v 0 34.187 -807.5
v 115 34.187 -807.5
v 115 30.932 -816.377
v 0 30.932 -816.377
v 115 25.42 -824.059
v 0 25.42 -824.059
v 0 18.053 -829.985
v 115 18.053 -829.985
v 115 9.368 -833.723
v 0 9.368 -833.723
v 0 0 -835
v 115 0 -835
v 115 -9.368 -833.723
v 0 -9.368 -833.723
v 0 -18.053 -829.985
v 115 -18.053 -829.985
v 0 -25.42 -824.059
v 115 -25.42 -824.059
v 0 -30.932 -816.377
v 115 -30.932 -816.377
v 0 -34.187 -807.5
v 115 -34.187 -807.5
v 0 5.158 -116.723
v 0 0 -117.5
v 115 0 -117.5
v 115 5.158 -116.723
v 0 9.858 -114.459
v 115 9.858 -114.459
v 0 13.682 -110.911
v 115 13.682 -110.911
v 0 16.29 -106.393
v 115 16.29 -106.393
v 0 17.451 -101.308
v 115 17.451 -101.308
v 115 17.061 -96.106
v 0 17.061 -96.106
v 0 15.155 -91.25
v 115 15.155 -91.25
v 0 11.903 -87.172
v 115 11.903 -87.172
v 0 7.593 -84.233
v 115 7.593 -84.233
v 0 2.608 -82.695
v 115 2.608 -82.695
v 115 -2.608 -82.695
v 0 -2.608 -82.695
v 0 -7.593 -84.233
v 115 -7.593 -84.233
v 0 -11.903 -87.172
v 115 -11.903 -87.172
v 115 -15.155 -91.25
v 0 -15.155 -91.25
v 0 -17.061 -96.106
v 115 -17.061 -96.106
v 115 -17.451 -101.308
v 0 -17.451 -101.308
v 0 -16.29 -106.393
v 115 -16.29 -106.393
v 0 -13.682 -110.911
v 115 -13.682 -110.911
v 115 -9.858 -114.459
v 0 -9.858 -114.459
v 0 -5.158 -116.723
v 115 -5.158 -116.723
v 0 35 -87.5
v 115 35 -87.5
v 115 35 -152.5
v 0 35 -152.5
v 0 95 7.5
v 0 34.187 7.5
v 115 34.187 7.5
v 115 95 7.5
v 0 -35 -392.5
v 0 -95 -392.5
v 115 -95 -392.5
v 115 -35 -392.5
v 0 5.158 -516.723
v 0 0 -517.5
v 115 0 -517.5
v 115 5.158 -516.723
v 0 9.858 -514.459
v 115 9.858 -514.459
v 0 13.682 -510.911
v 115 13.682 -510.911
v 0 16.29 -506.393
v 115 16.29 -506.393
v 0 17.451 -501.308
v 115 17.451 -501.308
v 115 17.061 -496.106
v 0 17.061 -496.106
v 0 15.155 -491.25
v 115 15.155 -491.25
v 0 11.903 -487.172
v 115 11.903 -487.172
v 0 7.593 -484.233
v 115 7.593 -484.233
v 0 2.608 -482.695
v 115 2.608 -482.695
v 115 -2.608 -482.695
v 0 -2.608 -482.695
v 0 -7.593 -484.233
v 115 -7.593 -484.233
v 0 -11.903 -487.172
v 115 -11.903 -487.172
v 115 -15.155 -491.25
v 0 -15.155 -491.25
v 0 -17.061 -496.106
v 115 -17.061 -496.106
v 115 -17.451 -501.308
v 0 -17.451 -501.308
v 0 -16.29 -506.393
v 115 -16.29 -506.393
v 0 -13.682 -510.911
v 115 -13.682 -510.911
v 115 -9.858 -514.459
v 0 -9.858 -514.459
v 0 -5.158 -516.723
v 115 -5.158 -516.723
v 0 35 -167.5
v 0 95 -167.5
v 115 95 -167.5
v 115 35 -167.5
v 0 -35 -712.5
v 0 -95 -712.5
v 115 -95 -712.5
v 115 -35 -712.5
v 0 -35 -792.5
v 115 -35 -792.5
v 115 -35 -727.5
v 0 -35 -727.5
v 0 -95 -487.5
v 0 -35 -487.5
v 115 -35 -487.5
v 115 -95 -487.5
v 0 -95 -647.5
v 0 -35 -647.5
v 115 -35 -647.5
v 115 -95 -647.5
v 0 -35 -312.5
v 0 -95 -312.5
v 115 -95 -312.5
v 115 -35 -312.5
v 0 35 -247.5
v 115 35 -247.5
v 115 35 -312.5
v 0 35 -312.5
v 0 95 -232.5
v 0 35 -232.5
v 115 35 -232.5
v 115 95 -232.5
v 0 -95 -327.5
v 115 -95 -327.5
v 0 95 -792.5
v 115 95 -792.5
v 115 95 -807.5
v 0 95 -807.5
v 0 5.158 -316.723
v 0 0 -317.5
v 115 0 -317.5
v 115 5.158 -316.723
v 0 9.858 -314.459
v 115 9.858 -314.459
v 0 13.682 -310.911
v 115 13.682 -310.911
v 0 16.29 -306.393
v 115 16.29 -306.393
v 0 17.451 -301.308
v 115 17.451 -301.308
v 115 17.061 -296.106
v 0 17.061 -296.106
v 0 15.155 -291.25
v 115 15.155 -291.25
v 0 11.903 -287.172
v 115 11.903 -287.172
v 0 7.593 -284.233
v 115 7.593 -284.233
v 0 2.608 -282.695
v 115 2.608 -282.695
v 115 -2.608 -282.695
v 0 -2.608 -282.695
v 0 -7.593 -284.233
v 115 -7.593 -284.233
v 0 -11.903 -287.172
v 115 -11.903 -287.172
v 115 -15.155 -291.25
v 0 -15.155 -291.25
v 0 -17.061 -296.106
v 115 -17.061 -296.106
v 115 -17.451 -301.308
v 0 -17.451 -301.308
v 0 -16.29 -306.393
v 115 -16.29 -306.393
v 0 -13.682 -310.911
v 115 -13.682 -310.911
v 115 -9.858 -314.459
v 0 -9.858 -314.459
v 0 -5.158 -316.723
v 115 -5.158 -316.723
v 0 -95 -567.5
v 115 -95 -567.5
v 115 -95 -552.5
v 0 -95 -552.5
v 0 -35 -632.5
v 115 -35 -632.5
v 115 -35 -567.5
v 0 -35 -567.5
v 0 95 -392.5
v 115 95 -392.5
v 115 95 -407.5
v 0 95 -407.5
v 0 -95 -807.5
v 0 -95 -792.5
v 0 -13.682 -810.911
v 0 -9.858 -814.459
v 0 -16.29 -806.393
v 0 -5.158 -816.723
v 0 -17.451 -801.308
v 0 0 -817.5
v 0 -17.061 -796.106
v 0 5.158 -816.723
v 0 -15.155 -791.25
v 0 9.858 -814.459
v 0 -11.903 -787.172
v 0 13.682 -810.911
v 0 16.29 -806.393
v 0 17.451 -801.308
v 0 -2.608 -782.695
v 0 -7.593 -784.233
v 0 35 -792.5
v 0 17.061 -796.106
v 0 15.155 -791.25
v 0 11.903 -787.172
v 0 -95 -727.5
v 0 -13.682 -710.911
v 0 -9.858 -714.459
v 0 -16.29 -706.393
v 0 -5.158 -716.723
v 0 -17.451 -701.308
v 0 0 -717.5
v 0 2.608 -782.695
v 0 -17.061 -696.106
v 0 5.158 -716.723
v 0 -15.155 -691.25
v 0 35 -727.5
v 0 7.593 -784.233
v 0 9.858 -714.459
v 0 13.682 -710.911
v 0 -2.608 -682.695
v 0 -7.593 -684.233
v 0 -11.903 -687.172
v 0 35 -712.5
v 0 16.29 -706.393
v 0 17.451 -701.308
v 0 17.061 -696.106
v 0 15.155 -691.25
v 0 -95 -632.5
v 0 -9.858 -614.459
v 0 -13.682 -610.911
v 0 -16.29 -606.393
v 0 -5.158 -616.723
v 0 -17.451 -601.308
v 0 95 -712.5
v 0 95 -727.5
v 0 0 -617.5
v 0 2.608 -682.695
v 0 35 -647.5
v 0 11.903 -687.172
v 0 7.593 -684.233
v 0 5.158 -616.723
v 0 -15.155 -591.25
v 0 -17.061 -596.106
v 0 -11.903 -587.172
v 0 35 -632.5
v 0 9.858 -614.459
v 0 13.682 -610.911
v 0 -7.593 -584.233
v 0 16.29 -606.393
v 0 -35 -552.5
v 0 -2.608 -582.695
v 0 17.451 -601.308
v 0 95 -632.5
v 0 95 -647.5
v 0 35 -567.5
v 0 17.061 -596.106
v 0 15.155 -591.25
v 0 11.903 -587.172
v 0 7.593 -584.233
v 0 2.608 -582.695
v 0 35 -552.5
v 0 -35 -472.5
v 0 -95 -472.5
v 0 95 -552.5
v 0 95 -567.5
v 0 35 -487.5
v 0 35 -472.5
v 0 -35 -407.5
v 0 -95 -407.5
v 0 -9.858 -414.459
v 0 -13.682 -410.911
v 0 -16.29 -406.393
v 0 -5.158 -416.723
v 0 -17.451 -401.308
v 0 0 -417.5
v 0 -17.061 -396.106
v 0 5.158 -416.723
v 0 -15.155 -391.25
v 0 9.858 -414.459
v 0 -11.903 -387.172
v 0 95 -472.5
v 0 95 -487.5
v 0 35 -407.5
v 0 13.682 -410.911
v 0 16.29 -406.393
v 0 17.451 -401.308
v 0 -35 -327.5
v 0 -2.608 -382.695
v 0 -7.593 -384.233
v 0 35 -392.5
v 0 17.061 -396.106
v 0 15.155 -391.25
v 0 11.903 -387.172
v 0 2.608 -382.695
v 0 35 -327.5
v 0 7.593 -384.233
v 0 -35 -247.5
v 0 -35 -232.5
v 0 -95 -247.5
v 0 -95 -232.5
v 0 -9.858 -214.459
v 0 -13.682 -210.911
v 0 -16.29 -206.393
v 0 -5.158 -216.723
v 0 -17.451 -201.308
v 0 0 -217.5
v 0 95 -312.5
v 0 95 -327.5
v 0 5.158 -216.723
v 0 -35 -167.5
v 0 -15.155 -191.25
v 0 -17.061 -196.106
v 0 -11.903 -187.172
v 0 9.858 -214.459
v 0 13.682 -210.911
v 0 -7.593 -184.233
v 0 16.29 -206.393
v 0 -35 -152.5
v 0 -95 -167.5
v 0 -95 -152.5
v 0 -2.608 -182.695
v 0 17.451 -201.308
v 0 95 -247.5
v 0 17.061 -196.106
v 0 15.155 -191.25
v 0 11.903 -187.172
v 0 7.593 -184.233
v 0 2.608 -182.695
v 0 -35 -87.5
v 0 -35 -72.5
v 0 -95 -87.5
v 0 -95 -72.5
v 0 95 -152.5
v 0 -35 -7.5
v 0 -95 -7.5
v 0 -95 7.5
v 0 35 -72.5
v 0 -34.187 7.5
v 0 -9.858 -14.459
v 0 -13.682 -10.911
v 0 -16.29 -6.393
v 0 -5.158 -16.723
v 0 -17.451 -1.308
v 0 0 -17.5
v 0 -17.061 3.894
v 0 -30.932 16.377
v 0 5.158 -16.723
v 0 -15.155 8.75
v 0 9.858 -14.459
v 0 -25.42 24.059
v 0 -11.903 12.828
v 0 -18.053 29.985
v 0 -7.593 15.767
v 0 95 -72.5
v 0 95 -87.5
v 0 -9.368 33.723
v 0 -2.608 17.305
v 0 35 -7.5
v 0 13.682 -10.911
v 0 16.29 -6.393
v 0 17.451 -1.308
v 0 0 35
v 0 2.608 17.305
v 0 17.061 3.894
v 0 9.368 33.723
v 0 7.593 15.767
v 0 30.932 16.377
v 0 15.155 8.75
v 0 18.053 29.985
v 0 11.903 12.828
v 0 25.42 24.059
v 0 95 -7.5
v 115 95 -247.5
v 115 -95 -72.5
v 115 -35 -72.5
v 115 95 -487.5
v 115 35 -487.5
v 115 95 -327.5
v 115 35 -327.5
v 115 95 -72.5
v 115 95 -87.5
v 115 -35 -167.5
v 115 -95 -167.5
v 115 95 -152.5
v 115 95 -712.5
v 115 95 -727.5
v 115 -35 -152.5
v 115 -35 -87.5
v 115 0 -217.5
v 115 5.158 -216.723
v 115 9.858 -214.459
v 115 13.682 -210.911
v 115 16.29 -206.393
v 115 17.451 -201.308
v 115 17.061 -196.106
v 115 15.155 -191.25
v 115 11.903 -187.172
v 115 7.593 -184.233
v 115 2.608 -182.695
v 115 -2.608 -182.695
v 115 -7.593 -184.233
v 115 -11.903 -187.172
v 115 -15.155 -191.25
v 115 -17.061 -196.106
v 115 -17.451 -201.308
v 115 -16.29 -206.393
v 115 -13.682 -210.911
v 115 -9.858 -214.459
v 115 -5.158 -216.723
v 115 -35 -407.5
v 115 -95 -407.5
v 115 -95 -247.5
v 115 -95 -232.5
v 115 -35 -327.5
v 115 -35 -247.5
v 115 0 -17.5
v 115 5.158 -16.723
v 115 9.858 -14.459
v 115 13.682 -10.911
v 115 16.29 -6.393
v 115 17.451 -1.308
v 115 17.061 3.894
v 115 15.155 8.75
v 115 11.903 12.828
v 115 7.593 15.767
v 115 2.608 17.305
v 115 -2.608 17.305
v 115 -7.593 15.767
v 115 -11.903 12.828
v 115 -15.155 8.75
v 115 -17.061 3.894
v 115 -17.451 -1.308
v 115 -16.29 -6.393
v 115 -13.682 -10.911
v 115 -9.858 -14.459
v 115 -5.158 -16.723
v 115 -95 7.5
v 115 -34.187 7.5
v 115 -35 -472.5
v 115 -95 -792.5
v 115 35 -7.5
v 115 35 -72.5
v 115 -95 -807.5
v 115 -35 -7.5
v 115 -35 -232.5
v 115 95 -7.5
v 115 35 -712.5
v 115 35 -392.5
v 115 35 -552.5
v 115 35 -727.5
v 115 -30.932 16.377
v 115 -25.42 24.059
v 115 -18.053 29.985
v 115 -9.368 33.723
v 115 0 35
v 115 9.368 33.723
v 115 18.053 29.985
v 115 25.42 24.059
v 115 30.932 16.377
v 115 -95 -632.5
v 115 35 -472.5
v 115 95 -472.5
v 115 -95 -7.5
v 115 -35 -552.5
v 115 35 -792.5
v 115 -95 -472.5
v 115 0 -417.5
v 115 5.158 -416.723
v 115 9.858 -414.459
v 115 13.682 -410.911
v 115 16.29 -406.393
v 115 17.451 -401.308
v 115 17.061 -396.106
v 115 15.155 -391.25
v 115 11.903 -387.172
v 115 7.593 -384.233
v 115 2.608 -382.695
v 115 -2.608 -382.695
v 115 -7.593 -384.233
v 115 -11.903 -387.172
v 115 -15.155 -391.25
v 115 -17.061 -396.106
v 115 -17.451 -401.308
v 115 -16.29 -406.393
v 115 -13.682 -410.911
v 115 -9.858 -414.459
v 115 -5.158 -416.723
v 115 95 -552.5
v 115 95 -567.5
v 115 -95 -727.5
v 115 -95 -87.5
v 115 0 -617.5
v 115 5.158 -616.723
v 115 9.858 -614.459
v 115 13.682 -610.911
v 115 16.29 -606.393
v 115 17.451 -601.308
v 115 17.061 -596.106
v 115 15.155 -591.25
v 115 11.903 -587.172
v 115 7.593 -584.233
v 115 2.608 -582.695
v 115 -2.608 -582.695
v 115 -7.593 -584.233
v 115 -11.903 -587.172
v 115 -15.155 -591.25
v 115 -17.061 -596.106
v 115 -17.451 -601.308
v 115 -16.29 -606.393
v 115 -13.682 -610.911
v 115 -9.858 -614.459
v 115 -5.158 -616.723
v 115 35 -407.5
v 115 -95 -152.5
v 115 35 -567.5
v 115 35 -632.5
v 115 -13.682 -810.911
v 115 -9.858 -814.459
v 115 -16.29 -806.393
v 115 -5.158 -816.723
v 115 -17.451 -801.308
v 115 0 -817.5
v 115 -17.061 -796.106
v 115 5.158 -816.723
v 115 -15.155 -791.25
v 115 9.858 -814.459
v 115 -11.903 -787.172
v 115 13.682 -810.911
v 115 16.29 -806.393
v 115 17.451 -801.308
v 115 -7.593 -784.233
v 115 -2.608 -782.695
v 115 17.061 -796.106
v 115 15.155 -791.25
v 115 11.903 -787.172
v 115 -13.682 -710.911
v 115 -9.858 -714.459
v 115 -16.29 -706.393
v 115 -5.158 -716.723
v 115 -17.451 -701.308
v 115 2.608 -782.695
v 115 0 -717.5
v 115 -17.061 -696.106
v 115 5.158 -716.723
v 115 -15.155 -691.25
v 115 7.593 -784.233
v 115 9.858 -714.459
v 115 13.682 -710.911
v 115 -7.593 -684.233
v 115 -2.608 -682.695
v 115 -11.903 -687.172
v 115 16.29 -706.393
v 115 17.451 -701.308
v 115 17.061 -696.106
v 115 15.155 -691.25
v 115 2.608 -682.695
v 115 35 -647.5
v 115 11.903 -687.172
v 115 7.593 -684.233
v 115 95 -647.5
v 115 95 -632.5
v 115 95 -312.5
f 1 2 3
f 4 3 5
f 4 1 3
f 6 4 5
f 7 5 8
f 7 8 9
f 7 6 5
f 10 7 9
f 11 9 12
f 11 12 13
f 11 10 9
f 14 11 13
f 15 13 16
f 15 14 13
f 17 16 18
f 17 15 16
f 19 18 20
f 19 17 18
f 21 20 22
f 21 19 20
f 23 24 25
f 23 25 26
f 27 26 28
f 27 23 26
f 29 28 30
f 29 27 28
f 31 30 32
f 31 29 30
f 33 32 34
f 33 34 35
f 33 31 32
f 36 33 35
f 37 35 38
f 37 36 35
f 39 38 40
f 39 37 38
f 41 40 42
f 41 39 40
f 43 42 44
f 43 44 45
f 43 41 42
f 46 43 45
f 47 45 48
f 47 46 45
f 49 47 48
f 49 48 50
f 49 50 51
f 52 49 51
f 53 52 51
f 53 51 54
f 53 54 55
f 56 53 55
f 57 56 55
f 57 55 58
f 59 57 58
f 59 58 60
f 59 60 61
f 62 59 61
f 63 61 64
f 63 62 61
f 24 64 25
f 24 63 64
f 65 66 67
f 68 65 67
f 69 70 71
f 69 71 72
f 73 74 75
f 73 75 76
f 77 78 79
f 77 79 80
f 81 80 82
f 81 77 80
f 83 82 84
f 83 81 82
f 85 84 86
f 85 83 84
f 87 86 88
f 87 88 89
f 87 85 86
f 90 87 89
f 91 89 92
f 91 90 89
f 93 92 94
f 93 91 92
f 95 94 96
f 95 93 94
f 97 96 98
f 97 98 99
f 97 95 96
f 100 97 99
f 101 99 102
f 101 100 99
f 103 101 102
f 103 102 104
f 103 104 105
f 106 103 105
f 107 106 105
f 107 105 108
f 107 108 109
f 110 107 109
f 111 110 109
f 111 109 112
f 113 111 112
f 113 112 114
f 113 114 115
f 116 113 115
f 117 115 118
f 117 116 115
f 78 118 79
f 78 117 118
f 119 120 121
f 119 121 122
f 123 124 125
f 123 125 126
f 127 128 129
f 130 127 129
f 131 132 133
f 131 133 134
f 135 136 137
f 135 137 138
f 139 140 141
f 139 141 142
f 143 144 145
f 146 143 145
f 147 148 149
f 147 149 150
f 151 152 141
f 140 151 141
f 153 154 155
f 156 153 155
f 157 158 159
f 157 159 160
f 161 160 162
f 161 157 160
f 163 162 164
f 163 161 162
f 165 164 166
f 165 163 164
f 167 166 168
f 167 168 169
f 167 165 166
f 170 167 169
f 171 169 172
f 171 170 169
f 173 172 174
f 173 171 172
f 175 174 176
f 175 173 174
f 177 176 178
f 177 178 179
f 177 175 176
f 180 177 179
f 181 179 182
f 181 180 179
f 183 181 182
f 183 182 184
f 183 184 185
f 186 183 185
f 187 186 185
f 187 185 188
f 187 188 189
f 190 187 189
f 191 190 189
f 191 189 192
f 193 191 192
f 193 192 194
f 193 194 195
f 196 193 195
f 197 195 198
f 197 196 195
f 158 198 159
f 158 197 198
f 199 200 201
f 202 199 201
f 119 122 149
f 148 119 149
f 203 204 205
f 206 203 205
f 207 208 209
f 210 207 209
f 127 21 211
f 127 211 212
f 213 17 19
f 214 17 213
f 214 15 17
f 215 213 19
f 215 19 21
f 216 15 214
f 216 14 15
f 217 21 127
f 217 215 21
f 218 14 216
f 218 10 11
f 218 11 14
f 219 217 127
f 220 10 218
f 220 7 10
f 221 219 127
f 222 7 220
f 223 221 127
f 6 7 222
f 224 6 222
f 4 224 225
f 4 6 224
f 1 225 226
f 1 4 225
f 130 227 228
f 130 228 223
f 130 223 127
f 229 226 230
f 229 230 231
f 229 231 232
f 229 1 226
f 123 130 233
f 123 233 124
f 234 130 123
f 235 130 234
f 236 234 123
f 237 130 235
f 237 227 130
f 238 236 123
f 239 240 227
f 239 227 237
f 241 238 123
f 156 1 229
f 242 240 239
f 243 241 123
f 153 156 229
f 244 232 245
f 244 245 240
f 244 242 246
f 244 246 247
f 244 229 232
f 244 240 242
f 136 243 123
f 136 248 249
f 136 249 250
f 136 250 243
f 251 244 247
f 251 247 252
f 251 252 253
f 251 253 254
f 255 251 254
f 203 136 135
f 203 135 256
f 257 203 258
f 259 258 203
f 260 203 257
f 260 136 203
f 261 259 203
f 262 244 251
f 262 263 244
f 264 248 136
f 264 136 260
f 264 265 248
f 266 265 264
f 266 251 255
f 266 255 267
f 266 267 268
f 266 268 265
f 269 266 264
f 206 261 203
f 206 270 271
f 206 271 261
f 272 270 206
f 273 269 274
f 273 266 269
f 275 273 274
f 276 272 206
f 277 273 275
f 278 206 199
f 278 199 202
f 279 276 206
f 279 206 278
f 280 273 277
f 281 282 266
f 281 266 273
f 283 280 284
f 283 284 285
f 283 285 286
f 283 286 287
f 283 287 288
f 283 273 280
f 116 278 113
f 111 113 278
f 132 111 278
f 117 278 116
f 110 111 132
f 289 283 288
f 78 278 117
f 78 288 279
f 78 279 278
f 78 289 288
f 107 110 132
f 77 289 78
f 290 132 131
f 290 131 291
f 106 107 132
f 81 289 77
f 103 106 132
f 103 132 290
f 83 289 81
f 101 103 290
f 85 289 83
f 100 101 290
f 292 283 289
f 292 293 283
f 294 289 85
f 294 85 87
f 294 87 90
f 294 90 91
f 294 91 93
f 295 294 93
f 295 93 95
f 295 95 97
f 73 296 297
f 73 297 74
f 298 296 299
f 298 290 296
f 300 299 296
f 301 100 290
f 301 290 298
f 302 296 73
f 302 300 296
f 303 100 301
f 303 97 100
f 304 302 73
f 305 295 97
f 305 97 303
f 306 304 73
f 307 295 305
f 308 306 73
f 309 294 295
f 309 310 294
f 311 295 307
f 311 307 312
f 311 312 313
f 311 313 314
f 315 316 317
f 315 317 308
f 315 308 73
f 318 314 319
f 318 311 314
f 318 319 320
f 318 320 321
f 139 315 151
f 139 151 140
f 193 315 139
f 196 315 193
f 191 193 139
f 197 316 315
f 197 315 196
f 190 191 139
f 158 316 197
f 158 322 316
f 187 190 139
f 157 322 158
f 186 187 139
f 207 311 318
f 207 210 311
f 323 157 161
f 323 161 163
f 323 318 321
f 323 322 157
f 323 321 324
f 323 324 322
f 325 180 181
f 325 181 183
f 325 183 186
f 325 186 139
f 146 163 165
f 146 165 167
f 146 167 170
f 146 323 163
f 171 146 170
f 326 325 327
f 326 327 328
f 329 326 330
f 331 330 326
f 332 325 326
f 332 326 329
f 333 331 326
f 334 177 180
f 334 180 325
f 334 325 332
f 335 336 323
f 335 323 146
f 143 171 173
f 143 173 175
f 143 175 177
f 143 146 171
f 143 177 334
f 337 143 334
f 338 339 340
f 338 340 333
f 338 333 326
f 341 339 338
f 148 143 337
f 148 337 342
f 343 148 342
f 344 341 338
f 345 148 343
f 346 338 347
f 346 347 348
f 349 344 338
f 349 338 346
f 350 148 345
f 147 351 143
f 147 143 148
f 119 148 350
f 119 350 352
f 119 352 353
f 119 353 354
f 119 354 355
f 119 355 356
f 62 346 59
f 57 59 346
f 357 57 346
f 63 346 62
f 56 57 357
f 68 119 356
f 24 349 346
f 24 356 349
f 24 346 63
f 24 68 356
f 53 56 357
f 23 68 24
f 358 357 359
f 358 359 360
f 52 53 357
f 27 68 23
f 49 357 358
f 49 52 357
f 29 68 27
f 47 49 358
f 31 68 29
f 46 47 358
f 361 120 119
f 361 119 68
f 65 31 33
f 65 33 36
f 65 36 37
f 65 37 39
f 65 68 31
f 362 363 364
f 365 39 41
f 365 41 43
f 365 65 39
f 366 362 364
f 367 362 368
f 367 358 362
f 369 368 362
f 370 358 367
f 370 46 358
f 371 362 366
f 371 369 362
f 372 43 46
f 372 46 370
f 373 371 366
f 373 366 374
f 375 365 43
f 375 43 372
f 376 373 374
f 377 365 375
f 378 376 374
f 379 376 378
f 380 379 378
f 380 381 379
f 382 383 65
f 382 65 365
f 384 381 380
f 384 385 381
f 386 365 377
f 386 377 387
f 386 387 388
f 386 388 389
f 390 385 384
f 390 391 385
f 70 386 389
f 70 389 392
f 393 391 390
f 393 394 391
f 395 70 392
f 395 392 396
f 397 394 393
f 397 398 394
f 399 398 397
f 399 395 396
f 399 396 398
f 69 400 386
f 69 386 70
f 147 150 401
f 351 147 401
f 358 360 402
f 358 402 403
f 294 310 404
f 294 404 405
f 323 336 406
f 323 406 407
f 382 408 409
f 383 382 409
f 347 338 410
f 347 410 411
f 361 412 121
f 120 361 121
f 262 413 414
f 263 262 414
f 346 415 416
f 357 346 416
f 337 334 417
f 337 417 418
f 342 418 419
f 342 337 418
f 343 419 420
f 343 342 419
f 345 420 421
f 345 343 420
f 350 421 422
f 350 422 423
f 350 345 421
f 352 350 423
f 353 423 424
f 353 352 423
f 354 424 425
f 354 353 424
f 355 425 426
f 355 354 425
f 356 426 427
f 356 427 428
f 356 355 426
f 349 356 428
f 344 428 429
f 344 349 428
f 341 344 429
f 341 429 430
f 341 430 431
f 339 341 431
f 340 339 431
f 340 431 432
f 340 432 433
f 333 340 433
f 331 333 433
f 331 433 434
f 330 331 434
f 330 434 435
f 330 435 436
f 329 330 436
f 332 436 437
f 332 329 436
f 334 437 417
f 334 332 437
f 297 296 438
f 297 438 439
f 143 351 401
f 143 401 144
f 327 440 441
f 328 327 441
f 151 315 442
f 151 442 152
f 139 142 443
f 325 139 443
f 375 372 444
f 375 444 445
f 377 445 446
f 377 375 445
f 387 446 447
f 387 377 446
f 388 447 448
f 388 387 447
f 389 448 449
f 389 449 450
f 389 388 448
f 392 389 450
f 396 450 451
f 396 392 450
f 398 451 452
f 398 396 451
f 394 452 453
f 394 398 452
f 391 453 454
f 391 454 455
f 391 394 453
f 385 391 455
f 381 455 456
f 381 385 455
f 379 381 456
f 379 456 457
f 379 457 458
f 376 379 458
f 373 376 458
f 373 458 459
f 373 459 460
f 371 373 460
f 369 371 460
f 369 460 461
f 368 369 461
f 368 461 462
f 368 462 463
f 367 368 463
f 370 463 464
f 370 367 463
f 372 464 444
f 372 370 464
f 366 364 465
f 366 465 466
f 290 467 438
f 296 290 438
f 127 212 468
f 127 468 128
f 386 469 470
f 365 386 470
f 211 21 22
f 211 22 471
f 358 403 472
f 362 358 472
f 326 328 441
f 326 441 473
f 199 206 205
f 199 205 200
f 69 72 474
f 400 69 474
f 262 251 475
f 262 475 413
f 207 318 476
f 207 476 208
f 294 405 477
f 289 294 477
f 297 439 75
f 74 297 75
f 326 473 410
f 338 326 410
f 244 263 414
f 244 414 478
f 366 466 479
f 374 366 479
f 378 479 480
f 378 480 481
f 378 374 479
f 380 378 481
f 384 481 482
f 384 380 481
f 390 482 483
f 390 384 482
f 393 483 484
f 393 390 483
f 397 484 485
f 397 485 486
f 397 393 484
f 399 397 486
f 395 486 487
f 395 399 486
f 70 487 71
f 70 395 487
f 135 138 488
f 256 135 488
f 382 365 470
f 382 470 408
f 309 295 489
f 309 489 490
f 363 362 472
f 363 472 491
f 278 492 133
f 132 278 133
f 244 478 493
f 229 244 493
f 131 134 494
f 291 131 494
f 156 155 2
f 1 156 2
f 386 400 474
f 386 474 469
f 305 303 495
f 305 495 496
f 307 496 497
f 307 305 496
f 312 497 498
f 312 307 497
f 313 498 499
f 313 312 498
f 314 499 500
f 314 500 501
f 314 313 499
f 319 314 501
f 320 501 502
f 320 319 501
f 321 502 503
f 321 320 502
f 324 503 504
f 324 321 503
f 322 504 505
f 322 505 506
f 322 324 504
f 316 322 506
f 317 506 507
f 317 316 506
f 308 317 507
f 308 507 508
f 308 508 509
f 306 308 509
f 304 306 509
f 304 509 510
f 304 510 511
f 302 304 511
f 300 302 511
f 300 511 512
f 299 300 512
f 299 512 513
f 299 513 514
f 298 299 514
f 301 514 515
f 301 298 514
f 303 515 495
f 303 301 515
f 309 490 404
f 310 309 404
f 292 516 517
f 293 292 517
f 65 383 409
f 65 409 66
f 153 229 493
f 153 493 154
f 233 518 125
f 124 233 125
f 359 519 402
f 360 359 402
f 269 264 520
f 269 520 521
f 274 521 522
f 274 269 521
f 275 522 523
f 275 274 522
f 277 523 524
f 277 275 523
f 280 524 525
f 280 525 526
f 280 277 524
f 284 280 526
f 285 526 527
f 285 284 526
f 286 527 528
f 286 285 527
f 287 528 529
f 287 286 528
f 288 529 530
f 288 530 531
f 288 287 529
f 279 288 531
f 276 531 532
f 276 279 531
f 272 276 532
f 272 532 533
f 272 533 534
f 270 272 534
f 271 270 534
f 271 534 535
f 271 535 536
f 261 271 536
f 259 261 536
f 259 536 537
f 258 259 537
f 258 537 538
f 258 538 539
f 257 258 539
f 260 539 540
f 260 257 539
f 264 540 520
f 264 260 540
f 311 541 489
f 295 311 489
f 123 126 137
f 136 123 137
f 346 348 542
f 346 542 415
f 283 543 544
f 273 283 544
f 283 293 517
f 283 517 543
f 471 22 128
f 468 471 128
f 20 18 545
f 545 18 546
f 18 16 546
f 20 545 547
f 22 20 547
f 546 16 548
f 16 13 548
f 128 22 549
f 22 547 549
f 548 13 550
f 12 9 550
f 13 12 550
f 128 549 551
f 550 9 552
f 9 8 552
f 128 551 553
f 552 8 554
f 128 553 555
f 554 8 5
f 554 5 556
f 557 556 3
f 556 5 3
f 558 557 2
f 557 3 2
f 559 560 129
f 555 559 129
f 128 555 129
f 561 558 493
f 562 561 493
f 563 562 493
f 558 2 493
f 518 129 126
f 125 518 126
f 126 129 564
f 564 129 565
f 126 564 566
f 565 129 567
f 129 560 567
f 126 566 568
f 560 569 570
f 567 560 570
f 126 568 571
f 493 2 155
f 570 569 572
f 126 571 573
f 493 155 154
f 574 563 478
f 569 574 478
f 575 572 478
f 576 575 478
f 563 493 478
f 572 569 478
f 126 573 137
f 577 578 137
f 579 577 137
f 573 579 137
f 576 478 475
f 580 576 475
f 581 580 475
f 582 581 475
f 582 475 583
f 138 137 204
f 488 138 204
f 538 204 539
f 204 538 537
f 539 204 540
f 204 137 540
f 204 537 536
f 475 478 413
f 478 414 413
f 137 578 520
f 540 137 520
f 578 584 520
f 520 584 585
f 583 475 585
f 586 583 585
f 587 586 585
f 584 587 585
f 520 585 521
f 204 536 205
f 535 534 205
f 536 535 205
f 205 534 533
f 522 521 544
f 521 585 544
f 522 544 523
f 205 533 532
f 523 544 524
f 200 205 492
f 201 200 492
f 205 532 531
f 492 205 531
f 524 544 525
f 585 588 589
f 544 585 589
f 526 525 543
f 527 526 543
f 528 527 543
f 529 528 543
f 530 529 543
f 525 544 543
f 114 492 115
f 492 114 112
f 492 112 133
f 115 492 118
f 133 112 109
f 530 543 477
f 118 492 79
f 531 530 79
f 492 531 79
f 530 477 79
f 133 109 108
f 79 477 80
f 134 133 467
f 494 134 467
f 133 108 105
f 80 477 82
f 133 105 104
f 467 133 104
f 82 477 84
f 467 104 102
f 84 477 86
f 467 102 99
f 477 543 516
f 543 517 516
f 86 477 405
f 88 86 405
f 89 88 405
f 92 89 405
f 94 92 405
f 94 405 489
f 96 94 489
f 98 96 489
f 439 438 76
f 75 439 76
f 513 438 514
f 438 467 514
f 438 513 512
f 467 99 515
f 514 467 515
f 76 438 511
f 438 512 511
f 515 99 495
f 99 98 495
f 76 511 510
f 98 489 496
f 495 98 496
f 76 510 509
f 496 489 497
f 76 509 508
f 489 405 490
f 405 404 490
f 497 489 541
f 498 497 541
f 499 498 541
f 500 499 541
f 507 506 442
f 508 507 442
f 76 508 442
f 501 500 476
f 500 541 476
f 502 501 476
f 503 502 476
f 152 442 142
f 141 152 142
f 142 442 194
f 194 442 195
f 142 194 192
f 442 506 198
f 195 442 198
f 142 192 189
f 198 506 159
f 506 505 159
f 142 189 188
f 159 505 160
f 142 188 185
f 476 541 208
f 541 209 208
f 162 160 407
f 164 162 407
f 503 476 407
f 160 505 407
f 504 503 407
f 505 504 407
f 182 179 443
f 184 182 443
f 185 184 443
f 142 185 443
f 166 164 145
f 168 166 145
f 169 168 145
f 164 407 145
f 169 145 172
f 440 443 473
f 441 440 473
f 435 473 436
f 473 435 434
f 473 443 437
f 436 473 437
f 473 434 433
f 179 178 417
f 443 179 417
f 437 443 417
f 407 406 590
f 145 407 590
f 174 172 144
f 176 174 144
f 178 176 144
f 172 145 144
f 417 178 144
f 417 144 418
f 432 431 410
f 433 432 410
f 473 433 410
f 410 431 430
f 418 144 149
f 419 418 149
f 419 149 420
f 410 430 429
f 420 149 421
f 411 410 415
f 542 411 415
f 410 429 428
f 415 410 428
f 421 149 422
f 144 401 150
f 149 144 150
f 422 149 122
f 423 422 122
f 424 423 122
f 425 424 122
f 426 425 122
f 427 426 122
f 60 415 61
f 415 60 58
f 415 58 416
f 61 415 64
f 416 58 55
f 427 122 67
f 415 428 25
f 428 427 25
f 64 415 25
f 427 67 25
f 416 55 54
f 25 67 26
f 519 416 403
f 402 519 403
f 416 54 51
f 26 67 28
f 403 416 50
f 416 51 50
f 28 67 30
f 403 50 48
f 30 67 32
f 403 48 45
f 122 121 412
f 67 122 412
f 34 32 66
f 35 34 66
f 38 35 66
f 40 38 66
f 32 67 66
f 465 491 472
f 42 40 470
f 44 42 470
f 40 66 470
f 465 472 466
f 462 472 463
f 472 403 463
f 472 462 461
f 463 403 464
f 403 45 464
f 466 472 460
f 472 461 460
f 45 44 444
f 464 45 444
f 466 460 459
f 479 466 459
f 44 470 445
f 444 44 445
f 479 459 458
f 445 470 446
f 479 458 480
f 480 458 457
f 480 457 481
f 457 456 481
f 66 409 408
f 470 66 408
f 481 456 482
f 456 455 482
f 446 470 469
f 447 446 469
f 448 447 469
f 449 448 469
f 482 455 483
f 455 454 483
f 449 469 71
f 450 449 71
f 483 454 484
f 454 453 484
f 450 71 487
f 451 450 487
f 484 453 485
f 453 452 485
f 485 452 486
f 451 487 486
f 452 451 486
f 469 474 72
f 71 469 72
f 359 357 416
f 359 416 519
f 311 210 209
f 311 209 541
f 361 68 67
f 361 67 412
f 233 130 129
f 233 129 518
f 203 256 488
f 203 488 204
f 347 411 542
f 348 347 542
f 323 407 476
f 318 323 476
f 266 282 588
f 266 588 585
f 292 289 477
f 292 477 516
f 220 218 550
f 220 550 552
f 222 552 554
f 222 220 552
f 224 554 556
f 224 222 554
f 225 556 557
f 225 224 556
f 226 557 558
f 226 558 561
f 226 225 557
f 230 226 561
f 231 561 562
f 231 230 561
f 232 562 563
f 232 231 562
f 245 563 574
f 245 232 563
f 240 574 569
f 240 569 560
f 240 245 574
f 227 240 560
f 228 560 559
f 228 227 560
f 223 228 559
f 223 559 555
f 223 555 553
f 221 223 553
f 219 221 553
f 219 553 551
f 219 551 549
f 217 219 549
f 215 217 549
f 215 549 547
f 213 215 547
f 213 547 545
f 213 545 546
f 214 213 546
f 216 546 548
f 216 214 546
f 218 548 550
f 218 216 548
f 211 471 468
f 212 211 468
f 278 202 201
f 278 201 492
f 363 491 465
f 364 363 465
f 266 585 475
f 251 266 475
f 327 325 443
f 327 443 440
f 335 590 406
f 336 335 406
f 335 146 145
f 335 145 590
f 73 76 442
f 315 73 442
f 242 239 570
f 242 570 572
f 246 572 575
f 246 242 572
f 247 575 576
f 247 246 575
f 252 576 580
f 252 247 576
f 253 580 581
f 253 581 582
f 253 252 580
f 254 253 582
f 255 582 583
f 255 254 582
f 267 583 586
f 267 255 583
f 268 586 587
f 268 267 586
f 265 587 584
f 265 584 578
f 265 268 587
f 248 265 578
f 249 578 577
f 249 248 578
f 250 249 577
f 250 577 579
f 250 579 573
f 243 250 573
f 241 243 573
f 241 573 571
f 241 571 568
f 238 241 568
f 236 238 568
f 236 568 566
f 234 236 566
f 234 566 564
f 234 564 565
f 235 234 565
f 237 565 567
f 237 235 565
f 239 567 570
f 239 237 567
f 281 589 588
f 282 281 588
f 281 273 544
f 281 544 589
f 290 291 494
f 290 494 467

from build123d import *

# Parameters (mm, degrees)
SKETCH1_R           = 17.5
BOSS_EXTRUDE1_DEPTH = 115


with BuildPart() as part:
    # Sketch1 → Boss-Extrude1 (new body)
    with BuildSketch(Plane(origin=(0, 0, 0), x_dir=(0, 0, -1), z_dir=(1, 0, 0))):
        with BuildLine():
            Line((7.5, 35), (72.5, 35))
            Line((72.5, 35), (72.5, 95))
            Line((72.5, 95), (87.5, 95))
            Line((87.5, 95), (87.5, 35))
            Line((87.5, 35), (152.5, 35))
            Line((152.5, 35), (152.5, 95))
            Line((152.5, 95), (167.5, 95))
            Line((167.5, 95), (167.5, 35))
            Line((167.5, 35), (232.5, 35))
            Line((232.5, 35), (232.5, 95))
            Line((232.5, 95), (247.5, 95))
            Line((247.5, 95), (247.5, 35))
            Line((247.5, 35), (312.5, 35))
            Line((312.5, 35), (312.5, 95))
            Line((312.5, 95), (327.5, 95))
            Line((327.5, 95), (327.5, 35))
            Line((327.5, 35), (392.5, 35))
            Line((392.5, 35), (392.5, 95))
            Line((392.5, 95), (407.5, 95))
            Line((407.5, 95), (407.5, 35))
            Line((407.5, 35), (472.5, 35))
            Line((472.5, 35), (472.5, 95))
            Line((472.5, 95), (487.5, 95))
            Line((487.5, 95), (487.5, 35))
            Line((487.5, 35), (552.5, 35))
            Line((552.5, 35), (552.5, 95))
            Line((552.5, 95), (567.5, 95))
            Line((567.5, 95), (567.5, 35))
            Line((567.5, 35), (632.5, 35))
            Line((632.5, 35), (632.5, 95))
            Line((632.5, 95), (647.5, 95))
            Line((647.5, 95), (647.5, 35))
            Line((647.5, 35), (712.5, 35))
            Line((712.5, 35), (712.5, 95))
            Line((712.5, 95), (727.5, 95))
            Line((727.5, 95), (727.5, 35))
            Line((727.5, 35), (792.5, 35))
            Line((792.5, 35), (792.5, 95))
            Line((792.5, 95), (807.5, 95))
            Line((807.5, 95), (807.5, 34.186985828))
            ThreePointArc((807.5, 34.186985828), (835, 0), (807.5, -34.186985828))
            Line((807.5, -34.186985828), (807.5, -95))
            Line((807.5, -95), (792.5, -95))
            Line((792.5, -95), (792.5, -35))
            Line((792.5, -35), (727.5, -35))
            Line((727.5, -35), (727.5, -95))
            Line((727.5, -95), (712.5, -95))
            Line((712.5, -95), (712.5, -35))
            Line((712.5, -35), (647.5, -35))
            Line((647.5, -35), (647.5, -95))
            Line((647.5, -95), (632.5, -95))
            Line((632.5, -95), (632.5, -35))
            Line((632.5, -35), (567.5, -35))
            Line((567.5, -35), (567.5, -95))
            Line((567.5, -95), (552.5, -95))
            Line((552.5, -95), (552.5, -35))
            Line((552.5, -35), (487.5, -35))
            Line((487.5, -35), (487.5, -95))
            Line((487.5, -95), (472.5, -95))
            Line((472.5, -95), (472.5, -35))
            Line((472.5, -35), (407.5, -35))
            Line((407.5, -35), (407.5, -95))
            Line((407.5, -95), (392.5, -95))
            Line((392.5, -95), (392.5, -35))
            Line((392.5, -35), (327.5, -35))
            Line((327.5, -35), (327.5, -95))
            Line((327.5, -95), (312.5, -95))
            Line((312.5, -95), (312.5, -35))
            Line((312.5, -35), (247.5, -35))
            Line((247.5, -35), (247.5, -95))
            Line((247.5, -95), (232.5, -95))
            Line((232.5, -95), (232.5, -35))
            Line((232.5, -35), (167.5, -35))
            Line((167.5, -35), (167.5, -95))
            Line((167.5, -95), (152.5, -95))
            Line((152.5, -95), (152.5, -35))
            Line((152.5, -35), (87.5, -35))
            Line((87.5, -35), (87.5, -95))
            Line((87.5, -95), (72.5, -95))
            Line((72.5, -95), (72.5, -35))
            Line((72.5, -35), (7.5, -35))
            Line((7.5, -35), (7.5, -95))
            Line((7.5, -95), (-7.5, -95))
            Line((-7.5, -95), (-7.5, -34.186985828))
            ThreePointArc((-7.5, -34.186985828), (-35, 0), (-7.5, 34.186985828))
            Line((-7.5, 34.186985828), (-7.5, 95))
            Line((-7.5, 95), (7.5, 95))
            Line((7.5, 95), (7.5, 35))
        make_face()
        Circle(SKETCH1_R, mode=Mode.SUBTRACT)
        with Locations((800, 0)):
            Circle(SKETCH1_R, mode=Mode.SUBTRACT)
        with Locations((100, 0)):
            Circle(SKETCH1_R, mode=Mode.SUBTRACT)
        with Locations((200, 0)):
            Circle(SKETCH1_R, mode=Mode.SUBTRACT)
        with Locations((300, 0)):
            Circle(SKETCH1_R, mode=Mode.SUBTRACT)
        with Locations((400, 0)):
            Circle(SKETCH1_R, mode=Mode.SUBTRACT)
        with Locations((500, 0)):
            Circle(SKETCH1_R, mode=Mode.SUBTRACT)
        with Locations((600, 0)):
            Circle(SKETCH1_R, mode=Mode.SUBTRACT)
        with Locations((700, 0)):
            Circle(SKETCH1_R, mode=Mode.SUBTRACT)
    extrude(amount=BOSS_EXTRUDE1_DEPTH)


solid = part.part
